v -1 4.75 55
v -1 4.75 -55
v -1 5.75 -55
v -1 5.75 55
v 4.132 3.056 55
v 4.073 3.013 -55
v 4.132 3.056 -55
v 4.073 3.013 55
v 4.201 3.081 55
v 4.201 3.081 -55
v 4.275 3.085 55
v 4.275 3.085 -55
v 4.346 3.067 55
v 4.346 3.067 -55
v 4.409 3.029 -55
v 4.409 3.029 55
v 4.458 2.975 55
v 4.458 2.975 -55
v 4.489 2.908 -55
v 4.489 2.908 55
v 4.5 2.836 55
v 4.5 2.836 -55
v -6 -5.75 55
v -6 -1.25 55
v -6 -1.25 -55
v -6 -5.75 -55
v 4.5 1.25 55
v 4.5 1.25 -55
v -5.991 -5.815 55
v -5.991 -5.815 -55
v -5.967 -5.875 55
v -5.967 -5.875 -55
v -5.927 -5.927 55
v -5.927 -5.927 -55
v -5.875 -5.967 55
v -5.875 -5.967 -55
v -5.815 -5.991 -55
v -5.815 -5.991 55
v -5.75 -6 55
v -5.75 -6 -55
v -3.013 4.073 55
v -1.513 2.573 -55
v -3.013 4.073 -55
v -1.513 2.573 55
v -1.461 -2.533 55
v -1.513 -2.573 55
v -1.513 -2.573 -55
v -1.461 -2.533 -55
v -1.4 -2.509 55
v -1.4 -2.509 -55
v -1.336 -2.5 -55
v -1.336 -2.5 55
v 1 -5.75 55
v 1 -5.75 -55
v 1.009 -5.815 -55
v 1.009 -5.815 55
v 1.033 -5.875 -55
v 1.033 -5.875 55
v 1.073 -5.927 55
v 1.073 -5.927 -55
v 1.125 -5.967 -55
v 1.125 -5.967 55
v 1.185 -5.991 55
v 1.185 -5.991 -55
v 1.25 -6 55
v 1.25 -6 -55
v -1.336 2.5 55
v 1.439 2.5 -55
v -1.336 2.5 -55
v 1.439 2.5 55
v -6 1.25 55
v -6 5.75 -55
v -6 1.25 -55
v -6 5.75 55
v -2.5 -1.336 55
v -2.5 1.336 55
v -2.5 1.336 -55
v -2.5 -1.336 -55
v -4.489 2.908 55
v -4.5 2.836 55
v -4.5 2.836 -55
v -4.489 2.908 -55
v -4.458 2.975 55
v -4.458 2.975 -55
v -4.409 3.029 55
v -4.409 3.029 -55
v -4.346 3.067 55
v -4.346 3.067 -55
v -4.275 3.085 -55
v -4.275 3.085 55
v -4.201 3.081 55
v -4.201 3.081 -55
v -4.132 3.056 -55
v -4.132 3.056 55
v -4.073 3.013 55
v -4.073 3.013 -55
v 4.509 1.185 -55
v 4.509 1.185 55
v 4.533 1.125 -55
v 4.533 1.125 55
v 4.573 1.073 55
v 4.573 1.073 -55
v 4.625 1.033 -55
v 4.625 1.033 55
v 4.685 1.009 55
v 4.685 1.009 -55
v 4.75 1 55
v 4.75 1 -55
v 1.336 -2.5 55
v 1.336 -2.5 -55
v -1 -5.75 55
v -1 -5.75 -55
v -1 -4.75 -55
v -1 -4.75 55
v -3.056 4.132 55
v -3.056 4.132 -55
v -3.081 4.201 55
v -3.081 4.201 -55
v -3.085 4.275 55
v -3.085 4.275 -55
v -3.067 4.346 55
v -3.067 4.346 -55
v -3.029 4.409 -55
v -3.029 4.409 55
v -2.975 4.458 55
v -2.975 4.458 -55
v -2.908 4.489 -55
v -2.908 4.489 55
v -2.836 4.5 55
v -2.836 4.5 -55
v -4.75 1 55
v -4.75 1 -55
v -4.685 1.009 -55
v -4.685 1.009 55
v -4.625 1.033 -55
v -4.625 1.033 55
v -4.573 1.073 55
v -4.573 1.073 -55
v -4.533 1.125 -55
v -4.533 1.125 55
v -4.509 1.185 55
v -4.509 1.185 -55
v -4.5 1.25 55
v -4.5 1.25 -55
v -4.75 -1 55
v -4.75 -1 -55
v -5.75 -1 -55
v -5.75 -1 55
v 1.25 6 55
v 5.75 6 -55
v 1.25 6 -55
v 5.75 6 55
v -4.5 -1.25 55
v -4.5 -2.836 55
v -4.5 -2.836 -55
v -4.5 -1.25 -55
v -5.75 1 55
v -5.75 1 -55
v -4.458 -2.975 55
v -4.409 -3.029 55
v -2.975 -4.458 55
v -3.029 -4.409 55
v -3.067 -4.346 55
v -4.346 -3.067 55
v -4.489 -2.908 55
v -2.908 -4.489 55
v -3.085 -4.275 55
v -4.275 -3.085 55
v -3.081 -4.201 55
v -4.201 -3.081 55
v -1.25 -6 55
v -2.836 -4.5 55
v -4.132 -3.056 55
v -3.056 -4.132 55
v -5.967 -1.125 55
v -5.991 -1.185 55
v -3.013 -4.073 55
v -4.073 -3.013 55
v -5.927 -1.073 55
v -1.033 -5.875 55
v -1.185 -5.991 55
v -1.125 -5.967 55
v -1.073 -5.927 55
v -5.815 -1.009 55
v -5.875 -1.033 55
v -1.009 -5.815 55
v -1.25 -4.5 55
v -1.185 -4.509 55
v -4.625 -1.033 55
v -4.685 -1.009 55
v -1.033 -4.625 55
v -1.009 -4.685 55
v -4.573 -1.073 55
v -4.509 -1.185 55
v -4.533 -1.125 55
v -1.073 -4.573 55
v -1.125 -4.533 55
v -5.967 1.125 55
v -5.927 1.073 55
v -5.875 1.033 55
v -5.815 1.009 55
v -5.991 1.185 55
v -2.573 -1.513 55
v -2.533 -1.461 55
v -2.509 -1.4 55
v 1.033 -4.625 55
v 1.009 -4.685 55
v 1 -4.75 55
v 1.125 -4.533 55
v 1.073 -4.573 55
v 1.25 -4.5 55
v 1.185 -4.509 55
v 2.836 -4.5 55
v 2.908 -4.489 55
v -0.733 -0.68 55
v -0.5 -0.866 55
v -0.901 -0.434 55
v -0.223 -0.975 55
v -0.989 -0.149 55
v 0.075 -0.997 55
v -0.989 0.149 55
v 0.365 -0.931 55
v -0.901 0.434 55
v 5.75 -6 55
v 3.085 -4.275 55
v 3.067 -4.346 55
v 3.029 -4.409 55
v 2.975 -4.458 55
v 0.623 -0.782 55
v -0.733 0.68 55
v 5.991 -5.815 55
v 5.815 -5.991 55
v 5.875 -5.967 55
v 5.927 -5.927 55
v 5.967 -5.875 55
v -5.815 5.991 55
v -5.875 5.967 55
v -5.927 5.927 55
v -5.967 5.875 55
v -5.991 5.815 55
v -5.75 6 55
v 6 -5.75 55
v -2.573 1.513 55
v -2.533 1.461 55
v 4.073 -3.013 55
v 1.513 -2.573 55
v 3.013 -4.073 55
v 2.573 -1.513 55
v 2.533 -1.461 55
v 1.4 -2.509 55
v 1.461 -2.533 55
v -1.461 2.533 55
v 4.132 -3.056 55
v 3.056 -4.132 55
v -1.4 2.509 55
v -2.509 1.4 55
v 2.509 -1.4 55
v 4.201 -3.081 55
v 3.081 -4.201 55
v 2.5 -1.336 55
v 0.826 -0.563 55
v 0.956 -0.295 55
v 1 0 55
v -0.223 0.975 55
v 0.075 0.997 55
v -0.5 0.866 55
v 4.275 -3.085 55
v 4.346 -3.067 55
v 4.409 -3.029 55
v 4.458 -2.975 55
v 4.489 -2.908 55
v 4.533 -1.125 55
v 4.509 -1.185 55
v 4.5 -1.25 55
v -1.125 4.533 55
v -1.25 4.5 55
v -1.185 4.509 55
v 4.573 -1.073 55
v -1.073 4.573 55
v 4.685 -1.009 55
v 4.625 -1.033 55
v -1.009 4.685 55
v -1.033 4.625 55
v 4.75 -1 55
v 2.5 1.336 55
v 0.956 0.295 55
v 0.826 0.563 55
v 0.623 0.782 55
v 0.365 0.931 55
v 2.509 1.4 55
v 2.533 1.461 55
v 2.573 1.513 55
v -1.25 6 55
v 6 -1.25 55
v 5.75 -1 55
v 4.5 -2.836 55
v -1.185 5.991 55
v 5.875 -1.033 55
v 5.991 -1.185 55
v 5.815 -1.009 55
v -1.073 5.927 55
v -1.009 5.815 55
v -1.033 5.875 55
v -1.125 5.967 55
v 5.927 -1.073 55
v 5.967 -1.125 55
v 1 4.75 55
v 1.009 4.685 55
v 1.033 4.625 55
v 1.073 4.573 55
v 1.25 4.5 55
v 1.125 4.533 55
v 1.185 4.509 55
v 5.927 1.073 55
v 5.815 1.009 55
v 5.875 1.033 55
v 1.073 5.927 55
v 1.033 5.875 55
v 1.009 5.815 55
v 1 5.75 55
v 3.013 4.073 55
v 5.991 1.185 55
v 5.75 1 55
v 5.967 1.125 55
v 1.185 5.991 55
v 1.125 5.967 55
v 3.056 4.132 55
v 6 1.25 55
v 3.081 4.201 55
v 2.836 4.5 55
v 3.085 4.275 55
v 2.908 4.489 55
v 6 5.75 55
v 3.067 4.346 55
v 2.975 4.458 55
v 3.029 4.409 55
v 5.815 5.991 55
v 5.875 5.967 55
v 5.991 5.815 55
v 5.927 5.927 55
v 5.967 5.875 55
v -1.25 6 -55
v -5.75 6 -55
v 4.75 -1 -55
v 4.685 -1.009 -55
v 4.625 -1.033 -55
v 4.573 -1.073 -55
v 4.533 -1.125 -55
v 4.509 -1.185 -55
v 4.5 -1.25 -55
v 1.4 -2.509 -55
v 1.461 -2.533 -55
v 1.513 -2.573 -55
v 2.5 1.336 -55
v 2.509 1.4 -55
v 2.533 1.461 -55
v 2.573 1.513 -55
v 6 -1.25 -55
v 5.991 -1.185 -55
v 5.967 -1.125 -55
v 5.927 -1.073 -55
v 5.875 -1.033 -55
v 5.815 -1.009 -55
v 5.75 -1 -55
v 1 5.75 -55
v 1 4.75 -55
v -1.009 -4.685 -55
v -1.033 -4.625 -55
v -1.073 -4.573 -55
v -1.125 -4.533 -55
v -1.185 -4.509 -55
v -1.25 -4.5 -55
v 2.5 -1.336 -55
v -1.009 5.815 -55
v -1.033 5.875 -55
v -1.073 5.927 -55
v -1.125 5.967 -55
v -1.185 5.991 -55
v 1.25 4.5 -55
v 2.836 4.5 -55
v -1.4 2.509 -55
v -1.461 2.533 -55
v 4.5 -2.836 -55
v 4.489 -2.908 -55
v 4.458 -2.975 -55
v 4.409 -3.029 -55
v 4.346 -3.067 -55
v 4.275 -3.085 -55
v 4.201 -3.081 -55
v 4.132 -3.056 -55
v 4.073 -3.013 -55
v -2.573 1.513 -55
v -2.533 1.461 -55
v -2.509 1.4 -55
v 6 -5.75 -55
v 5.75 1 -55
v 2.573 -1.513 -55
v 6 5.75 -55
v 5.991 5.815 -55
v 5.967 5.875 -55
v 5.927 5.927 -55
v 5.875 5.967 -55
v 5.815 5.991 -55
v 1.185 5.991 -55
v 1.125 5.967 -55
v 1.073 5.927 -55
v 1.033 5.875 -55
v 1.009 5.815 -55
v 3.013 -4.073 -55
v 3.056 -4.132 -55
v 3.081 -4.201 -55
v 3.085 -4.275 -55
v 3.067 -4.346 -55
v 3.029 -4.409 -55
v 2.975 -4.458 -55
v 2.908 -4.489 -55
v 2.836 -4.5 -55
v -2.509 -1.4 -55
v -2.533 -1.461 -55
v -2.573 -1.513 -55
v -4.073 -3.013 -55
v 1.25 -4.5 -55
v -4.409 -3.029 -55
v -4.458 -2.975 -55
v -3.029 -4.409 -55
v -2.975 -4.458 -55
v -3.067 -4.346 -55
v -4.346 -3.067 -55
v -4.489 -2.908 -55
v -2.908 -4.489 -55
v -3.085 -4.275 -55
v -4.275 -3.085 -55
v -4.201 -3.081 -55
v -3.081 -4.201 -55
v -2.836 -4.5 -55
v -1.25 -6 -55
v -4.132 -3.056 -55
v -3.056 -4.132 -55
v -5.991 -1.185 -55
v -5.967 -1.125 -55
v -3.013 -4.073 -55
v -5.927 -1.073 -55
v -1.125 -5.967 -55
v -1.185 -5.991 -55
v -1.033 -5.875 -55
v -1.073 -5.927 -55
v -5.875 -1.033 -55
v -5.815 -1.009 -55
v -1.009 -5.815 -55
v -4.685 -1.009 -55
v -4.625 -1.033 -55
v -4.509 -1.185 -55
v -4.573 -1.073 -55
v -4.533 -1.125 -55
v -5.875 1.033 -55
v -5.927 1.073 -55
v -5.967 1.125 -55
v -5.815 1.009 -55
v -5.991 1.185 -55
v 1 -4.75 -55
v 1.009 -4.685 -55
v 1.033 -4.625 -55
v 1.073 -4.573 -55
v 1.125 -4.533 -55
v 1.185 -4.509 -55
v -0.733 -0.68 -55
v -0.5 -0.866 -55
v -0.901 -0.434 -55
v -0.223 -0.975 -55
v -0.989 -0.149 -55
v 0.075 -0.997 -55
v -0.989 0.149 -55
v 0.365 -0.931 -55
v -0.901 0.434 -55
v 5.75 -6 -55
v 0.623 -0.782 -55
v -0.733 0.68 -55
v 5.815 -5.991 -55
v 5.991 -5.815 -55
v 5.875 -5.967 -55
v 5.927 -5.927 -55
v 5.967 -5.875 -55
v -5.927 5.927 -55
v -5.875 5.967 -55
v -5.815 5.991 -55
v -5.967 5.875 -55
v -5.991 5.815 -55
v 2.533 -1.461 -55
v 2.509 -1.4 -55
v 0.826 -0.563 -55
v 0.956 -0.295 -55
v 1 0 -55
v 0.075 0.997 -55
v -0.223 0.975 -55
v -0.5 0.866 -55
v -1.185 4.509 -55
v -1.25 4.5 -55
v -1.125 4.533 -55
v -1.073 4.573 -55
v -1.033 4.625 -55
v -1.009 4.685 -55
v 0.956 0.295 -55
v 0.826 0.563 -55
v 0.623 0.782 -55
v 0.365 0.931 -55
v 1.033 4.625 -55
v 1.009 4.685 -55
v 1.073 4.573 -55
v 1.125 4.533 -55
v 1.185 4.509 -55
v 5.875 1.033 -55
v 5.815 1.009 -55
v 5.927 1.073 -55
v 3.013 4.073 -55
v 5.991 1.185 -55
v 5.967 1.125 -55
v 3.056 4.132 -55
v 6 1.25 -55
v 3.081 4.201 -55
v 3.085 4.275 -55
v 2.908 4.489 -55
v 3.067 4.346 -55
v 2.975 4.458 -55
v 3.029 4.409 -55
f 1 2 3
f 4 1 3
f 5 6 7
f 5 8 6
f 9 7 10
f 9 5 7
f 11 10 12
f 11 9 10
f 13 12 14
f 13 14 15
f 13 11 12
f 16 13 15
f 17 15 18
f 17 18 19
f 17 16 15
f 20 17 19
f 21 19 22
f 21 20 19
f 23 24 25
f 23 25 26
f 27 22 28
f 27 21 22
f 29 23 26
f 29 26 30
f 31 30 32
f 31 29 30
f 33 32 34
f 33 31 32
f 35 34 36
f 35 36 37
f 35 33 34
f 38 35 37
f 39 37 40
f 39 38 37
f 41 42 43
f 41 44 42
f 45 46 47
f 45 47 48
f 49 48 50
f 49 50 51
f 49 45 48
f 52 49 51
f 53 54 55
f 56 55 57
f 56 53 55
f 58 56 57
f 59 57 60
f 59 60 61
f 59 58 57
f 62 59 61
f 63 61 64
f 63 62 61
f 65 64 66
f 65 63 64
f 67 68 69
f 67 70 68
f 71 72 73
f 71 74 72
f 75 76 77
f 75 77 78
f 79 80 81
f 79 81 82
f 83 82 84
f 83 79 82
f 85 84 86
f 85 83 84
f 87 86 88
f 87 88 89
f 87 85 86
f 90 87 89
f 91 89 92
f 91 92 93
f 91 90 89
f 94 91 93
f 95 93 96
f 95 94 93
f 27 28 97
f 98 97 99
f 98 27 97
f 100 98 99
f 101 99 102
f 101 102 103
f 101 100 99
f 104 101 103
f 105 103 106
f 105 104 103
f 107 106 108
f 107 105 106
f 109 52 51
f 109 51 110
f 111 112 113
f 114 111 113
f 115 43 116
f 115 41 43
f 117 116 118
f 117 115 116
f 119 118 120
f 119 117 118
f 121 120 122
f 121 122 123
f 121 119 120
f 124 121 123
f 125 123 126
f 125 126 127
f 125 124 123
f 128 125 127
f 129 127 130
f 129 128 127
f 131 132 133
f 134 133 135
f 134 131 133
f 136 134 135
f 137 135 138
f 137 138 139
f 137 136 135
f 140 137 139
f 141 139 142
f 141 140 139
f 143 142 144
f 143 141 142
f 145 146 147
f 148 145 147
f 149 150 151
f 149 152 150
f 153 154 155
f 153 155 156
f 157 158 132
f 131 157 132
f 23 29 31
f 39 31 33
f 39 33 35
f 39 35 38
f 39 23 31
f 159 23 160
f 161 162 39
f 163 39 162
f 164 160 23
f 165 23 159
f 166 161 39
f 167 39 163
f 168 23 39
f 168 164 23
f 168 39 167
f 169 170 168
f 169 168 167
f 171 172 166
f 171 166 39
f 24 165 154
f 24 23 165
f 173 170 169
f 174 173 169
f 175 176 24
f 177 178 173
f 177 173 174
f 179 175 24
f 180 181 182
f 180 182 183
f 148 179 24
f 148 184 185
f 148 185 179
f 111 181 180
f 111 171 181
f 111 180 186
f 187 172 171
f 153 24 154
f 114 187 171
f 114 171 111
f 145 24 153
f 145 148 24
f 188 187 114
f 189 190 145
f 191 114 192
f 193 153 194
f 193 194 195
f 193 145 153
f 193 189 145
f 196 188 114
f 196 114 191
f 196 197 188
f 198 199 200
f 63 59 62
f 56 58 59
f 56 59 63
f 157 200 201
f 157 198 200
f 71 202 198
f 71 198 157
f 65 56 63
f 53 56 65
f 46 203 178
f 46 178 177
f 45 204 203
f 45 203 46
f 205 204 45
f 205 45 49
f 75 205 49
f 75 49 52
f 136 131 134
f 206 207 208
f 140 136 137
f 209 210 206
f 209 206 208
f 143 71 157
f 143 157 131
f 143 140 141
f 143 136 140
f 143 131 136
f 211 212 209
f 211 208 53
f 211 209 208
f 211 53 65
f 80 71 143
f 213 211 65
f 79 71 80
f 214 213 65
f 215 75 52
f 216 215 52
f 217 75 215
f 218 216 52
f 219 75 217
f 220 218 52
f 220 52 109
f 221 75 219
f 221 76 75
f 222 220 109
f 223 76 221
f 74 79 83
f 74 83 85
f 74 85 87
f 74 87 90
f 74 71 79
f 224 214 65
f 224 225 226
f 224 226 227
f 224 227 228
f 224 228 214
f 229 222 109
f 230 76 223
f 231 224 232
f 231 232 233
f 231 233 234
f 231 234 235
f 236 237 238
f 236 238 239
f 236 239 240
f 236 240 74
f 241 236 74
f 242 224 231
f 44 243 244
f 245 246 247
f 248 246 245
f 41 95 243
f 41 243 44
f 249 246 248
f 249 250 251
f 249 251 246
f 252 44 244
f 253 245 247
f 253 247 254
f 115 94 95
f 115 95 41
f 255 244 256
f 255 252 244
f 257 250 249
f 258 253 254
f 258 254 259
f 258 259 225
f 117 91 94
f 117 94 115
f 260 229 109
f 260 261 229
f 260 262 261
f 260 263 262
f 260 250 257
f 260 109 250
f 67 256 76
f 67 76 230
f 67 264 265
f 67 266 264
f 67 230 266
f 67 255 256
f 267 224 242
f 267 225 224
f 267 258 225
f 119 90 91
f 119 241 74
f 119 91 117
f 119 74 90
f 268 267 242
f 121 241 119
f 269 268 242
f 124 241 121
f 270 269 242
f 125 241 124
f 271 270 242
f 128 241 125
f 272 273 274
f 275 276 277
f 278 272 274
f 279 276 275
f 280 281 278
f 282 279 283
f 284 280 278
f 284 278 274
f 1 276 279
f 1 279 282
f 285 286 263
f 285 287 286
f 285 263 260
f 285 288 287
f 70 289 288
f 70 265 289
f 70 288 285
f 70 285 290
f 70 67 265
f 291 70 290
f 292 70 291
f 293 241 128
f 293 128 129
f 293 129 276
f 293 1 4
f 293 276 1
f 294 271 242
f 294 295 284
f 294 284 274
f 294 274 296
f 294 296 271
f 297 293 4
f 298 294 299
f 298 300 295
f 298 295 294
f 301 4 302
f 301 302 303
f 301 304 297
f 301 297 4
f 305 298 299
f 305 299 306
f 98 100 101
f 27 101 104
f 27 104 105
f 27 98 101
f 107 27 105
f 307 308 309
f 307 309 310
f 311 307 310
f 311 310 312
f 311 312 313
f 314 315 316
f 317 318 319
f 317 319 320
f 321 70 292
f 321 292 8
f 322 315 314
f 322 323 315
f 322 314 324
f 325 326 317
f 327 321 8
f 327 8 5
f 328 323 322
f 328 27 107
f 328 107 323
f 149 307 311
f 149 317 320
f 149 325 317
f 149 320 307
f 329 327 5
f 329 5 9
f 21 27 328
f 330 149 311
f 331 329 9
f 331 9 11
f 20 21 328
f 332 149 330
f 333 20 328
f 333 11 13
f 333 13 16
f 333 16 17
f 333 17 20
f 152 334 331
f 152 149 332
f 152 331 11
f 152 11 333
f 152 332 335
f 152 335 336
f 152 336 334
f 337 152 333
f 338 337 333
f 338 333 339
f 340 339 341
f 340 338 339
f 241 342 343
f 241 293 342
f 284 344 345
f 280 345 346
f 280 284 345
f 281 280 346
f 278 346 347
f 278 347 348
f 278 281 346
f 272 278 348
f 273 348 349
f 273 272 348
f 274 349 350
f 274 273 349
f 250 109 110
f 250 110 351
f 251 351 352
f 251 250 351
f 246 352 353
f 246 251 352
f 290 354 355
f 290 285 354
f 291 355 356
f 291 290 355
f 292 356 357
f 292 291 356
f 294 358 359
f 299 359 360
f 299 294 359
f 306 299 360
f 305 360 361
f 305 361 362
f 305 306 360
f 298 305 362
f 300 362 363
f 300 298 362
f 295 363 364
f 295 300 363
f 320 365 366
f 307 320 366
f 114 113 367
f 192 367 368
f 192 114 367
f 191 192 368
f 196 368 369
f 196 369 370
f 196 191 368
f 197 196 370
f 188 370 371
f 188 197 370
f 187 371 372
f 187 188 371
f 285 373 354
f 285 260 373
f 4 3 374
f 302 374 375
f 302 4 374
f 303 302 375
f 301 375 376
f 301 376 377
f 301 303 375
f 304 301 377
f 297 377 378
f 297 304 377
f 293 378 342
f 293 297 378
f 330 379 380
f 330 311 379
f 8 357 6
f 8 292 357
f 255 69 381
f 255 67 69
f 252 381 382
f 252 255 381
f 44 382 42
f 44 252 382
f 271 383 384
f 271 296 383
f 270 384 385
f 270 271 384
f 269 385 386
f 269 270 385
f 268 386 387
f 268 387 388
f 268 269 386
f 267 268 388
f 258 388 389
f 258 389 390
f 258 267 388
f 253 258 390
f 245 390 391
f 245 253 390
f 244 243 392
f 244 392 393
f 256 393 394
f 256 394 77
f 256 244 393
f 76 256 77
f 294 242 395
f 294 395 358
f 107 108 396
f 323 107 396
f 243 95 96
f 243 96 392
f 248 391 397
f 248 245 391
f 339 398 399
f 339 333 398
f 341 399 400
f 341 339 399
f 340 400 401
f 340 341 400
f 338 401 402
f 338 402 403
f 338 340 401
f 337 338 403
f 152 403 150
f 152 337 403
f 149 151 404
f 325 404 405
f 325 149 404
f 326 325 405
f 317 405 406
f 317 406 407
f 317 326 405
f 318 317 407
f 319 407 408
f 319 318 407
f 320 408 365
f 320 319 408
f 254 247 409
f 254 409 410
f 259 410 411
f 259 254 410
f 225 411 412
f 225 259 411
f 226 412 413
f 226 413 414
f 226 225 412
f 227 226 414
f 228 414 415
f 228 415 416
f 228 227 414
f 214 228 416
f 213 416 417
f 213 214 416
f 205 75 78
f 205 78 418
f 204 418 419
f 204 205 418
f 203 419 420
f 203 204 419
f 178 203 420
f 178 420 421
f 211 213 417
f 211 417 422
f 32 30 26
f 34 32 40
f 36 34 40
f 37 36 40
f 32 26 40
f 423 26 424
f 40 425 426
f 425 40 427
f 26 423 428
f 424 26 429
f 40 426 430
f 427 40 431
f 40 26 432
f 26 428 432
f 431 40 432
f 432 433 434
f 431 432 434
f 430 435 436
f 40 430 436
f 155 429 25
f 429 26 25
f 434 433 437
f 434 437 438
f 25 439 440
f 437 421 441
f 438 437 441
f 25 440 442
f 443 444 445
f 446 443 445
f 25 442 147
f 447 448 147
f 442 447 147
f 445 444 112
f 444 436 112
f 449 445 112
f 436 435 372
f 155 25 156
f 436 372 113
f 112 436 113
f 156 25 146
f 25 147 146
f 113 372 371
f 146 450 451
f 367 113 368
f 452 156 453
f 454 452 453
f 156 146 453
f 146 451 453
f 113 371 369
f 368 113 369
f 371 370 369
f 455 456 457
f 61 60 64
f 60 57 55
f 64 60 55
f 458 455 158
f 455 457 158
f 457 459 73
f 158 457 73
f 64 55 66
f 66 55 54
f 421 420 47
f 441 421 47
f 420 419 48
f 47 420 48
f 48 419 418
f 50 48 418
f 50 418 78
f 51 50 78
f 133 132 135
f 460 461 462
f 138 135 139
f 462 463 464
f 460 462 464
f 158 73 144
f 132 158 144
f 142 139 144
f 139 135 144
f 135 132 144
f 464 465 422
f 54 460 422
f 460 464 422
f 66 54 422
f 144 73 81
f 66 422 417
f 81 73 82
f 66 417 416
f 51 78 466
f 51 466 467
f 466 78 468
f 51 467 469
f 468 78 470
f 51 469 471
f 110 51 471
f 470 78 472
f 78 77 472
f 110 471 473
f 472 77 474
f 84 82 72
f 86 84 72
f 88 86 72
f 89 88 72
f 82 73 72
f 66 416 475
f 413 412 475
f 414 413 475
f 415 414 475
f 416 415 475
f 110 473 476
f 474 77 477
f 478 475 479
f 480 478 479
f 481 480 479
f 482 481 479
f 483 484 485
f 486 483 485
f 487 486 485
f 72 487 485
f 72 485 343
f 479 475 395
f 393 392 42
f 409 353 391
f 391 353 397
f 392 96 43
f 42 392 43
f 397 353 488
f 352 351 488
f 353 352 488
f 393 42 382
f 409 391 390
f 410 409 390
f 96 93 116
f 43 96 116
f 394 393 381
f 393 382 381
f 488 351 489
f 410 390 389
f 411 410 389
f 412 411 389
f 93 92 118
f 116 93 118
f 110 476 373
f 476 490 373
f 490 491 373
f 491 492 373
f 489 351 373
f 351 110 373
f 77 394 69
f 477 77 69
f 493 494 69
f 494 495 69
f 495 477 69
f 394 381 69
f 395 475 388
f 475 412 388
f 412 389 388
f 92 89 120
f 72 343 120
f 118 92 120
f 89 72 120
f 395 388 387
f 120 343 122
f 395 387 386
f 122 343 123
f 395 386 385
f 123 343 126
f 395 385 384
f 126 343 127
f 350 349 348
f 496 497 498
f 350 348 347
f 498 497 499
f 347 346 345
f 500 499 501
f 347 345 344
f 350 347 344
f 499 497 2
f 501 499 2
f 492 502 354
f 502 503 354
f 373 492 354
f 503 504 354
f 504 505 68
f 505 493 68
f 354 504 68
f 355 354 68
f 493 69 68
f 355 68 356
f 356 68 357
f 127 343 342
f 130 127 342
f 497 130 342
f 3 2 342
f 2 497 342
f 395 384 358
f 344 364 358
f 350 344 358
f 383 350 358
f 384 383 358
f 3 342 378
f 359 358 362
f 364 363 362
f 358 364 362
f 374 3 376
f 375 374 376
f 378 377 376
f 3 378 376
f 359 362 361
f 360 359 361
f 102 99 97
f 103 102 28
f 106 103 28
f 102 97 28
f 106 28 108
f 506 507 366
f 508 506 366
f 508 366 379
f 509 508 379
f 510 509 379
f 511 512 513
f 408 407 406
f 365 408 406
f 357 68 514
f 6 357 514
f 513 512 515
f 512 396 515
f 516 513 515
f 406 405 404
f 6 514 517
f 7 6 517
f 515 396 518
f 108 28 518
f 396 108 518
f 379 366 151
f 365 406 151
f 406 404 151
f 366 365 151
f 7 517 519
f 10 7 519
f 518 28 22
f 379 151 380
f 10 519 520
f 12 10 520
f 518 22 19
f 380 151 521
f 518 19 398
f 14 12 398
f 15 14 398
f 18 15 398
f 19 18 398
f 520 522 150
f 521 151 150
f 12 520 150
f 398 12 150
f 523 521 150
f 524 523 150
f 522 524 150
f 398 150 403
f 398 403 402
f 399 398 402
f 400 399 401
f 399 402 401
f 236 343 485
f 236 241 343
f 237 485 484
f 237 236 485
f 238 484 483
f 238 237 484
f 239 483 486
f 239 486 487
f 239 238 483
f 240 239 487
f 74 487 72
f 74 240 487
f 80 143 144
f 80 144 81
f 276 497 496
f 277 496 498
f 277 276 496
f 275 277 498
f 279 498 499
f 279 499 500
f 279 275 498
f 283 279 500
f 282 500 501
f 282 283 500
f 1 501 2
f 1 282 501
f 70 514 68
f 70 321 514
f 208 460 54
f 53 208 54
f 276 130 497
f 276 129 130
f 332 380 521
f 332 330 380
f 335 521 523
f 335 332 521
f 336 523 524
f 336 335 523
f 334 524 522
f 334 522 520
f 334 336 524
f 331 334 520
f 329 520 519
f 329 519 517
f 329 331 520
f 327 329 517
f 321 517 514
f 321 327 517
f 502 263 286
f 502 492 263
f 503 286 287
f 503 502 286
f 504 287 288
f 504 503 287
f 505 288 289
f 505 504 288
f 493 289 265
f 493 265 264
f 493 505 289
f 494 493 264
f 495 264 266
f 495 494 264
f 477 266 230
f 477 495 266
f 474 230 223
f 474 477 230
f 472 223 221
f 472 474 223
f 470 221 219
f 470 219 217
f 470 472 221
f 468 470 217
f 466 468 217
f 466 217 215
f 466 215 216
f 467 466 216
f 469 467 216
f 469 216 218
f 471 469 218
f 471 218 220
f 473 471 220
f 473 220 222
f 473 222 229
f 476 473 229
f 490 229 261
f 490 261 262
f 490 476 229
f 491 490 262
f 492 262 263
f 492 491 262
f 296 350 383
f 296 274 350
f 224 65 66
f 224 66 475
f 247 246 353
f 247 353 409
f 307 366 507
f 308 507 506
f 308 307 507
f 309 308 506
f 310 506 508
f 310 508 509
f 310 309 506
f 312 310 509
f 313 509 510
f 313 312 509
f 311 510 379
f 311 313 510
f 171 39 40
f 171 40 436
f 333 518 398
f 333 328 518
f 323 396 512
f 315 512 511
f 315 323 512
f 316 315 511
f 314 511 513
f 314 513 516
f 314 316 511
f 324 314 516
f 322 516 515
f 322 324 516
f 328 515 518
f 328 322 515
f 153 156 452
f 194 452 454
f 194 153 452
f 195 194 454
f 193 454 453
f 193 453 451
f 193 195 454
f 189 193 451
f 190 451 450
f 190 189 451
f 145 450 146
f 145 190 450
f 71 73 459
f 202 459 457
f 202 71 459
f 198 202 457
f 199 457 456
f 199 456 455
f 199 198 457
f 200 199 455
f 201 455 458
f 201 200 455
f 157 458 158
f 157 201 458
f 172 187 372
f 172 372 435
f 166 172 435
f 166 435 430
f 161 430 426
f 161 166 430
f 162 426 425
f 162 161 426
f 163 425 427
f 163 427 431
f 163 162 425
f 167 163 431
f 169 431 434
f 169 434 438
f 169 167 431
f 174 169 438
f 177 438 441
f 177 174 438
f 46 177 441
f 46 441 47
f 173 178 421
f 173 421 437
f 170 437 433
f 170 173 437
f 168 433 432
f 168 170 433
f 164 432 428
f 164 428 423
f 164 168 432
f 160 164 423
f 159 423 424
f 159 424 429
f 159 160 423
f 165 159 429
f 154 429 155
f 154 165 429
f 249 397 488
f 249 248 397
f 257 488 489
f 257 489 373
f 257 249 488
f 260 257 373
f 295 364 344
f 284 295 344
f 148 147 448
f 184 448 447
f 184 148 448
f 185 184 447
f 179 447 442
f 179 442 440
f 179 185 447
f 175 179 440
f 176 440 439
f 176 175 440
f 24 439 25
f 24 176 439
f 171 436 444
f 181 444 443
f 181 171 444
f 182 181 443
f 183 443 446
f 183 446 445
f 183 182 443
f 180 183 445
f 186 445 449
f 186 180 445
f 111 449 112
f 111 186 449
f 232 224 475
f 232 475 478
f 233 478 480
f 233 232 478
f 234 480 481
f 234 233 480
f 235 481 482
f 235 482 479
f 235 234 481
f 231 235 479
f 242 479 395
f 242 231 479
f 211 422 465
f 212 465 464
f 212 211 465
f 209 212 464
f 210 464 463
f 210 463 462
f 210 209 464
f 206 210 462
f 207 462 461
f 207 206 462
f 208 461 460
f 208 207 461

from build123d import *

# Parameters (mm, degrees)
SKETCH1_R           = 1
BOSS_EXTRUDE1_DEPTH = 55


with BuildPart() as part:
    # Sketch1 → Boss-Extrude1 (new body, symmetric)
    with BuildSketch(Plane.XY):
        with BuildLine():
            ThreePointArc((-6, 1.25), (-5.926776695, 1.073223305), (-5.75, 1))
            Line((-5.75, 1), (-4.75, 1))
            ThreePointArc((-4.75, 1), (-4.573223305, 1.073223305), (-4.5, 1.25))
            Line((-4.5, 1.25), (-4.5, 2.835786438))
            ThreePointArc((-4.5, 2.835786438), (-4.345670858, 3.066756321), (-4.073223305, 3.012563133))
            Line((-4.073223305, 3.012563133), (-2.573223305, 1.512563133))
            ThreePointArc((-2.573223305, 1.512563133), (-2.519030117, 1.431457296), (-2.5, 1.335786438))
            Line((-2.5, 1.335786438), (-2.5, -1.335786438))
            ThreePointArc((-2.5, -1.335786438), (-2.519030117, -1.431457296), (-2.573223305, -1.512563133))
            Line((-2.573223305, -1.512563133), (-4.073223305, -3.012563133))
            ThreePointArc((-4.073223305, -3.012563133), (-4.345670858, -3.066756321), (-4.5, -2.835786438))
            Line((-4.5, -2.835786438), (-4.5, -1.25))
            ThreePointArc((-4.5, -1.25), (-4.573223305, -1.073223305), (-4.75, -1))
            Line((-4.75, -1), (-5.75, -1))
            ThreePointArc((-5.75, -1), (-5.926776695, -1.073223305), (-6, -1.25))
            Line((-6, -1.25), (-6, -5.75))
            ThreePointArc((-6, -5.75), (-5.926776695, -5.926776695), (-5.75, -6))
            Line((-5.75, -6), (-1.25, -6))
            ThreePointArc((-1.25, -6), (-1.073223305, -5.926776695), (-1, -5.75))
            Line((-1, -5.75), (-1, -4.75))
            ThreePointArc((-1, -4.75), (-1.073223305, -4.573223305), (-1.25, -4.5))
            Line((-1.25, -4.5), (-2.835786438, -4.5))
            ThreePointArc((-2.835786438, -4.5), (-3.066756321, -4.345670858), (-3.012563133, -4.073223305))
            Line((-3.012563133, -4.073223305), (-1.512563133, -2.573223305))
            ThreePointArc((-1.512563133, -2.573223305), (-1.431457296, -2.519030117), (-1.335786438, -2.5))
            Line((-1.335786438, -2.5), (1.335786438, -2.5))
            ThreePointArc((1.335786438, -2.5), (1.431457296, -2.519030117), (1.512563133, -2.573223305))
            Line((1.512563133, -2.573223305), (3.012563133, -4.073223305))
            ThreePointArc((3.012563133, -4.073223305), (3.066756321, -4.345670858), (2.835786438, -4.5))
            Line((2.835786438, -4.5), (1.25, -4.5))
            ThreePointArc((1.25, -4.5), (1.073223305, -4.573223305), (1, -4.75))
            Line((1, -4.75), (1, -5.75))
            ThreePointArc((1, -5.75), (1.073223305, -5.926776695), (1.25, -6))
            Line((1.25, -6), (5.75, -6))
            ThreePointArc((5.75, -6), (5.926776695, -5.926776695), (6, -5.75))
            Line((6, -5.75), (6, -1.25))
            ThreePointArc((6, -1.25), (5.926776695, -1.073223305), (5.75, -1))
            Line((5.75, -1), (4.75, -1))
            ThreePointArc((4.75, -1), (4.573223305, -1.073223305), (4.5, -1.25))
            Line((4.5, -1.25), (4.5, -2.835786438))
            ThreePointArc((4.5, -2.835786438), (4.345670858, -3.066756321), (4.073223305, -3.012563133))
            Line((4.073223305, -3.012563133), (2.573223305, -1.512563133))
            ThreePointArc((2.573223305, -1.512563133), (2.519030117, -1.431457296), (2.5, -1.335786438))
            Line((2.5, -1.335786438), (2.5, 1.335786438))
            ThreePointArc((2.5, 1.335786438), (2.519030117, 1.431457296), (2.573223305, 1.512563133))
            Line((2.573223305, 1.512563133), (4.073223305, 3.012563133))
            ThreePointArc((4.073223305, 3.012563133), (4.345670858, 3.066756321), (4.5, 2.835786438))
            Line((4.5, 2.835786438), (4.5, 1.25))
            ThreePointArc((4.5, 1.25), (4.573223305, 1.073223305), (4.75, 1))
            Line((4.75, 1), (5.75, 1))
            ThreePointArc((5.75, 1), (5.926776695, 1.073223305), (6, 1.25))
            Line((6, 1.25), (6, 5.75))
            ThreePointArc((6, 5.75), (5.926776695, 5.926776695), (5.75, 6))
            Line((5.75, 6), (1.25, 6))
            ThreePointArc((1.25, 6), (1.073223305, 5.926776695), (1, 5.75))
            Line((1, 5.75), (1, 4.75))
            ThreePointArc((1, 4.75), (1.073223305, 4.573223305), (1.25, 4.5))
            Line((1.25, 4.5), (2.835786438, 4.5))
            ThreePointArc((2.835786438, 4.5), (3.066756321, 4.345670858), (3.012563133, 4.073223305))
            Line((3.012563133, 4.073223305), (1.439339828, 2.5))
            Line((1.439339828, 2.5), (-1.335786438, 2.5))
            ThreePointArc((-1.335786438, 2.5), (-1.431457296, 2.519030117), (-1.512563133, 2.573223305))
            Line((-1.512563133, 2.573223305), (-3.012563133, 4.073223305))
            ThreePointArc((-3.012563133, 4.073223305), (-3.066756321, 4.345670858), (-2.835786438, 4.5))
            Line((-2.835786438, 4.5), (-1.25, 4.5))
            ThreePointArc((-1.25, 4.5), (-1.073223305, 4.573223305), (-1, 4.75))
            Line((-1, 4.75), (-1, 5.75))
            ThreePointArc((-1, 5.75), (-1.073223305, 5.926776695), (-1.25, 6))
            Line((-1.25, 6), (-5.75, 6))
            ThreePointArc((-5.75, 6), (-5.926776695, 5.926776695), (-6, 5.75))
            Line((-6, 5.75), (-6, 1.25))
        make_face()
        Circle(SKETCH1_R, mode=Mode.SUBTRACT)
    extrude(amount=BOSS_EXTRUDE1_DEPTH, both=True)


solid = part.part
